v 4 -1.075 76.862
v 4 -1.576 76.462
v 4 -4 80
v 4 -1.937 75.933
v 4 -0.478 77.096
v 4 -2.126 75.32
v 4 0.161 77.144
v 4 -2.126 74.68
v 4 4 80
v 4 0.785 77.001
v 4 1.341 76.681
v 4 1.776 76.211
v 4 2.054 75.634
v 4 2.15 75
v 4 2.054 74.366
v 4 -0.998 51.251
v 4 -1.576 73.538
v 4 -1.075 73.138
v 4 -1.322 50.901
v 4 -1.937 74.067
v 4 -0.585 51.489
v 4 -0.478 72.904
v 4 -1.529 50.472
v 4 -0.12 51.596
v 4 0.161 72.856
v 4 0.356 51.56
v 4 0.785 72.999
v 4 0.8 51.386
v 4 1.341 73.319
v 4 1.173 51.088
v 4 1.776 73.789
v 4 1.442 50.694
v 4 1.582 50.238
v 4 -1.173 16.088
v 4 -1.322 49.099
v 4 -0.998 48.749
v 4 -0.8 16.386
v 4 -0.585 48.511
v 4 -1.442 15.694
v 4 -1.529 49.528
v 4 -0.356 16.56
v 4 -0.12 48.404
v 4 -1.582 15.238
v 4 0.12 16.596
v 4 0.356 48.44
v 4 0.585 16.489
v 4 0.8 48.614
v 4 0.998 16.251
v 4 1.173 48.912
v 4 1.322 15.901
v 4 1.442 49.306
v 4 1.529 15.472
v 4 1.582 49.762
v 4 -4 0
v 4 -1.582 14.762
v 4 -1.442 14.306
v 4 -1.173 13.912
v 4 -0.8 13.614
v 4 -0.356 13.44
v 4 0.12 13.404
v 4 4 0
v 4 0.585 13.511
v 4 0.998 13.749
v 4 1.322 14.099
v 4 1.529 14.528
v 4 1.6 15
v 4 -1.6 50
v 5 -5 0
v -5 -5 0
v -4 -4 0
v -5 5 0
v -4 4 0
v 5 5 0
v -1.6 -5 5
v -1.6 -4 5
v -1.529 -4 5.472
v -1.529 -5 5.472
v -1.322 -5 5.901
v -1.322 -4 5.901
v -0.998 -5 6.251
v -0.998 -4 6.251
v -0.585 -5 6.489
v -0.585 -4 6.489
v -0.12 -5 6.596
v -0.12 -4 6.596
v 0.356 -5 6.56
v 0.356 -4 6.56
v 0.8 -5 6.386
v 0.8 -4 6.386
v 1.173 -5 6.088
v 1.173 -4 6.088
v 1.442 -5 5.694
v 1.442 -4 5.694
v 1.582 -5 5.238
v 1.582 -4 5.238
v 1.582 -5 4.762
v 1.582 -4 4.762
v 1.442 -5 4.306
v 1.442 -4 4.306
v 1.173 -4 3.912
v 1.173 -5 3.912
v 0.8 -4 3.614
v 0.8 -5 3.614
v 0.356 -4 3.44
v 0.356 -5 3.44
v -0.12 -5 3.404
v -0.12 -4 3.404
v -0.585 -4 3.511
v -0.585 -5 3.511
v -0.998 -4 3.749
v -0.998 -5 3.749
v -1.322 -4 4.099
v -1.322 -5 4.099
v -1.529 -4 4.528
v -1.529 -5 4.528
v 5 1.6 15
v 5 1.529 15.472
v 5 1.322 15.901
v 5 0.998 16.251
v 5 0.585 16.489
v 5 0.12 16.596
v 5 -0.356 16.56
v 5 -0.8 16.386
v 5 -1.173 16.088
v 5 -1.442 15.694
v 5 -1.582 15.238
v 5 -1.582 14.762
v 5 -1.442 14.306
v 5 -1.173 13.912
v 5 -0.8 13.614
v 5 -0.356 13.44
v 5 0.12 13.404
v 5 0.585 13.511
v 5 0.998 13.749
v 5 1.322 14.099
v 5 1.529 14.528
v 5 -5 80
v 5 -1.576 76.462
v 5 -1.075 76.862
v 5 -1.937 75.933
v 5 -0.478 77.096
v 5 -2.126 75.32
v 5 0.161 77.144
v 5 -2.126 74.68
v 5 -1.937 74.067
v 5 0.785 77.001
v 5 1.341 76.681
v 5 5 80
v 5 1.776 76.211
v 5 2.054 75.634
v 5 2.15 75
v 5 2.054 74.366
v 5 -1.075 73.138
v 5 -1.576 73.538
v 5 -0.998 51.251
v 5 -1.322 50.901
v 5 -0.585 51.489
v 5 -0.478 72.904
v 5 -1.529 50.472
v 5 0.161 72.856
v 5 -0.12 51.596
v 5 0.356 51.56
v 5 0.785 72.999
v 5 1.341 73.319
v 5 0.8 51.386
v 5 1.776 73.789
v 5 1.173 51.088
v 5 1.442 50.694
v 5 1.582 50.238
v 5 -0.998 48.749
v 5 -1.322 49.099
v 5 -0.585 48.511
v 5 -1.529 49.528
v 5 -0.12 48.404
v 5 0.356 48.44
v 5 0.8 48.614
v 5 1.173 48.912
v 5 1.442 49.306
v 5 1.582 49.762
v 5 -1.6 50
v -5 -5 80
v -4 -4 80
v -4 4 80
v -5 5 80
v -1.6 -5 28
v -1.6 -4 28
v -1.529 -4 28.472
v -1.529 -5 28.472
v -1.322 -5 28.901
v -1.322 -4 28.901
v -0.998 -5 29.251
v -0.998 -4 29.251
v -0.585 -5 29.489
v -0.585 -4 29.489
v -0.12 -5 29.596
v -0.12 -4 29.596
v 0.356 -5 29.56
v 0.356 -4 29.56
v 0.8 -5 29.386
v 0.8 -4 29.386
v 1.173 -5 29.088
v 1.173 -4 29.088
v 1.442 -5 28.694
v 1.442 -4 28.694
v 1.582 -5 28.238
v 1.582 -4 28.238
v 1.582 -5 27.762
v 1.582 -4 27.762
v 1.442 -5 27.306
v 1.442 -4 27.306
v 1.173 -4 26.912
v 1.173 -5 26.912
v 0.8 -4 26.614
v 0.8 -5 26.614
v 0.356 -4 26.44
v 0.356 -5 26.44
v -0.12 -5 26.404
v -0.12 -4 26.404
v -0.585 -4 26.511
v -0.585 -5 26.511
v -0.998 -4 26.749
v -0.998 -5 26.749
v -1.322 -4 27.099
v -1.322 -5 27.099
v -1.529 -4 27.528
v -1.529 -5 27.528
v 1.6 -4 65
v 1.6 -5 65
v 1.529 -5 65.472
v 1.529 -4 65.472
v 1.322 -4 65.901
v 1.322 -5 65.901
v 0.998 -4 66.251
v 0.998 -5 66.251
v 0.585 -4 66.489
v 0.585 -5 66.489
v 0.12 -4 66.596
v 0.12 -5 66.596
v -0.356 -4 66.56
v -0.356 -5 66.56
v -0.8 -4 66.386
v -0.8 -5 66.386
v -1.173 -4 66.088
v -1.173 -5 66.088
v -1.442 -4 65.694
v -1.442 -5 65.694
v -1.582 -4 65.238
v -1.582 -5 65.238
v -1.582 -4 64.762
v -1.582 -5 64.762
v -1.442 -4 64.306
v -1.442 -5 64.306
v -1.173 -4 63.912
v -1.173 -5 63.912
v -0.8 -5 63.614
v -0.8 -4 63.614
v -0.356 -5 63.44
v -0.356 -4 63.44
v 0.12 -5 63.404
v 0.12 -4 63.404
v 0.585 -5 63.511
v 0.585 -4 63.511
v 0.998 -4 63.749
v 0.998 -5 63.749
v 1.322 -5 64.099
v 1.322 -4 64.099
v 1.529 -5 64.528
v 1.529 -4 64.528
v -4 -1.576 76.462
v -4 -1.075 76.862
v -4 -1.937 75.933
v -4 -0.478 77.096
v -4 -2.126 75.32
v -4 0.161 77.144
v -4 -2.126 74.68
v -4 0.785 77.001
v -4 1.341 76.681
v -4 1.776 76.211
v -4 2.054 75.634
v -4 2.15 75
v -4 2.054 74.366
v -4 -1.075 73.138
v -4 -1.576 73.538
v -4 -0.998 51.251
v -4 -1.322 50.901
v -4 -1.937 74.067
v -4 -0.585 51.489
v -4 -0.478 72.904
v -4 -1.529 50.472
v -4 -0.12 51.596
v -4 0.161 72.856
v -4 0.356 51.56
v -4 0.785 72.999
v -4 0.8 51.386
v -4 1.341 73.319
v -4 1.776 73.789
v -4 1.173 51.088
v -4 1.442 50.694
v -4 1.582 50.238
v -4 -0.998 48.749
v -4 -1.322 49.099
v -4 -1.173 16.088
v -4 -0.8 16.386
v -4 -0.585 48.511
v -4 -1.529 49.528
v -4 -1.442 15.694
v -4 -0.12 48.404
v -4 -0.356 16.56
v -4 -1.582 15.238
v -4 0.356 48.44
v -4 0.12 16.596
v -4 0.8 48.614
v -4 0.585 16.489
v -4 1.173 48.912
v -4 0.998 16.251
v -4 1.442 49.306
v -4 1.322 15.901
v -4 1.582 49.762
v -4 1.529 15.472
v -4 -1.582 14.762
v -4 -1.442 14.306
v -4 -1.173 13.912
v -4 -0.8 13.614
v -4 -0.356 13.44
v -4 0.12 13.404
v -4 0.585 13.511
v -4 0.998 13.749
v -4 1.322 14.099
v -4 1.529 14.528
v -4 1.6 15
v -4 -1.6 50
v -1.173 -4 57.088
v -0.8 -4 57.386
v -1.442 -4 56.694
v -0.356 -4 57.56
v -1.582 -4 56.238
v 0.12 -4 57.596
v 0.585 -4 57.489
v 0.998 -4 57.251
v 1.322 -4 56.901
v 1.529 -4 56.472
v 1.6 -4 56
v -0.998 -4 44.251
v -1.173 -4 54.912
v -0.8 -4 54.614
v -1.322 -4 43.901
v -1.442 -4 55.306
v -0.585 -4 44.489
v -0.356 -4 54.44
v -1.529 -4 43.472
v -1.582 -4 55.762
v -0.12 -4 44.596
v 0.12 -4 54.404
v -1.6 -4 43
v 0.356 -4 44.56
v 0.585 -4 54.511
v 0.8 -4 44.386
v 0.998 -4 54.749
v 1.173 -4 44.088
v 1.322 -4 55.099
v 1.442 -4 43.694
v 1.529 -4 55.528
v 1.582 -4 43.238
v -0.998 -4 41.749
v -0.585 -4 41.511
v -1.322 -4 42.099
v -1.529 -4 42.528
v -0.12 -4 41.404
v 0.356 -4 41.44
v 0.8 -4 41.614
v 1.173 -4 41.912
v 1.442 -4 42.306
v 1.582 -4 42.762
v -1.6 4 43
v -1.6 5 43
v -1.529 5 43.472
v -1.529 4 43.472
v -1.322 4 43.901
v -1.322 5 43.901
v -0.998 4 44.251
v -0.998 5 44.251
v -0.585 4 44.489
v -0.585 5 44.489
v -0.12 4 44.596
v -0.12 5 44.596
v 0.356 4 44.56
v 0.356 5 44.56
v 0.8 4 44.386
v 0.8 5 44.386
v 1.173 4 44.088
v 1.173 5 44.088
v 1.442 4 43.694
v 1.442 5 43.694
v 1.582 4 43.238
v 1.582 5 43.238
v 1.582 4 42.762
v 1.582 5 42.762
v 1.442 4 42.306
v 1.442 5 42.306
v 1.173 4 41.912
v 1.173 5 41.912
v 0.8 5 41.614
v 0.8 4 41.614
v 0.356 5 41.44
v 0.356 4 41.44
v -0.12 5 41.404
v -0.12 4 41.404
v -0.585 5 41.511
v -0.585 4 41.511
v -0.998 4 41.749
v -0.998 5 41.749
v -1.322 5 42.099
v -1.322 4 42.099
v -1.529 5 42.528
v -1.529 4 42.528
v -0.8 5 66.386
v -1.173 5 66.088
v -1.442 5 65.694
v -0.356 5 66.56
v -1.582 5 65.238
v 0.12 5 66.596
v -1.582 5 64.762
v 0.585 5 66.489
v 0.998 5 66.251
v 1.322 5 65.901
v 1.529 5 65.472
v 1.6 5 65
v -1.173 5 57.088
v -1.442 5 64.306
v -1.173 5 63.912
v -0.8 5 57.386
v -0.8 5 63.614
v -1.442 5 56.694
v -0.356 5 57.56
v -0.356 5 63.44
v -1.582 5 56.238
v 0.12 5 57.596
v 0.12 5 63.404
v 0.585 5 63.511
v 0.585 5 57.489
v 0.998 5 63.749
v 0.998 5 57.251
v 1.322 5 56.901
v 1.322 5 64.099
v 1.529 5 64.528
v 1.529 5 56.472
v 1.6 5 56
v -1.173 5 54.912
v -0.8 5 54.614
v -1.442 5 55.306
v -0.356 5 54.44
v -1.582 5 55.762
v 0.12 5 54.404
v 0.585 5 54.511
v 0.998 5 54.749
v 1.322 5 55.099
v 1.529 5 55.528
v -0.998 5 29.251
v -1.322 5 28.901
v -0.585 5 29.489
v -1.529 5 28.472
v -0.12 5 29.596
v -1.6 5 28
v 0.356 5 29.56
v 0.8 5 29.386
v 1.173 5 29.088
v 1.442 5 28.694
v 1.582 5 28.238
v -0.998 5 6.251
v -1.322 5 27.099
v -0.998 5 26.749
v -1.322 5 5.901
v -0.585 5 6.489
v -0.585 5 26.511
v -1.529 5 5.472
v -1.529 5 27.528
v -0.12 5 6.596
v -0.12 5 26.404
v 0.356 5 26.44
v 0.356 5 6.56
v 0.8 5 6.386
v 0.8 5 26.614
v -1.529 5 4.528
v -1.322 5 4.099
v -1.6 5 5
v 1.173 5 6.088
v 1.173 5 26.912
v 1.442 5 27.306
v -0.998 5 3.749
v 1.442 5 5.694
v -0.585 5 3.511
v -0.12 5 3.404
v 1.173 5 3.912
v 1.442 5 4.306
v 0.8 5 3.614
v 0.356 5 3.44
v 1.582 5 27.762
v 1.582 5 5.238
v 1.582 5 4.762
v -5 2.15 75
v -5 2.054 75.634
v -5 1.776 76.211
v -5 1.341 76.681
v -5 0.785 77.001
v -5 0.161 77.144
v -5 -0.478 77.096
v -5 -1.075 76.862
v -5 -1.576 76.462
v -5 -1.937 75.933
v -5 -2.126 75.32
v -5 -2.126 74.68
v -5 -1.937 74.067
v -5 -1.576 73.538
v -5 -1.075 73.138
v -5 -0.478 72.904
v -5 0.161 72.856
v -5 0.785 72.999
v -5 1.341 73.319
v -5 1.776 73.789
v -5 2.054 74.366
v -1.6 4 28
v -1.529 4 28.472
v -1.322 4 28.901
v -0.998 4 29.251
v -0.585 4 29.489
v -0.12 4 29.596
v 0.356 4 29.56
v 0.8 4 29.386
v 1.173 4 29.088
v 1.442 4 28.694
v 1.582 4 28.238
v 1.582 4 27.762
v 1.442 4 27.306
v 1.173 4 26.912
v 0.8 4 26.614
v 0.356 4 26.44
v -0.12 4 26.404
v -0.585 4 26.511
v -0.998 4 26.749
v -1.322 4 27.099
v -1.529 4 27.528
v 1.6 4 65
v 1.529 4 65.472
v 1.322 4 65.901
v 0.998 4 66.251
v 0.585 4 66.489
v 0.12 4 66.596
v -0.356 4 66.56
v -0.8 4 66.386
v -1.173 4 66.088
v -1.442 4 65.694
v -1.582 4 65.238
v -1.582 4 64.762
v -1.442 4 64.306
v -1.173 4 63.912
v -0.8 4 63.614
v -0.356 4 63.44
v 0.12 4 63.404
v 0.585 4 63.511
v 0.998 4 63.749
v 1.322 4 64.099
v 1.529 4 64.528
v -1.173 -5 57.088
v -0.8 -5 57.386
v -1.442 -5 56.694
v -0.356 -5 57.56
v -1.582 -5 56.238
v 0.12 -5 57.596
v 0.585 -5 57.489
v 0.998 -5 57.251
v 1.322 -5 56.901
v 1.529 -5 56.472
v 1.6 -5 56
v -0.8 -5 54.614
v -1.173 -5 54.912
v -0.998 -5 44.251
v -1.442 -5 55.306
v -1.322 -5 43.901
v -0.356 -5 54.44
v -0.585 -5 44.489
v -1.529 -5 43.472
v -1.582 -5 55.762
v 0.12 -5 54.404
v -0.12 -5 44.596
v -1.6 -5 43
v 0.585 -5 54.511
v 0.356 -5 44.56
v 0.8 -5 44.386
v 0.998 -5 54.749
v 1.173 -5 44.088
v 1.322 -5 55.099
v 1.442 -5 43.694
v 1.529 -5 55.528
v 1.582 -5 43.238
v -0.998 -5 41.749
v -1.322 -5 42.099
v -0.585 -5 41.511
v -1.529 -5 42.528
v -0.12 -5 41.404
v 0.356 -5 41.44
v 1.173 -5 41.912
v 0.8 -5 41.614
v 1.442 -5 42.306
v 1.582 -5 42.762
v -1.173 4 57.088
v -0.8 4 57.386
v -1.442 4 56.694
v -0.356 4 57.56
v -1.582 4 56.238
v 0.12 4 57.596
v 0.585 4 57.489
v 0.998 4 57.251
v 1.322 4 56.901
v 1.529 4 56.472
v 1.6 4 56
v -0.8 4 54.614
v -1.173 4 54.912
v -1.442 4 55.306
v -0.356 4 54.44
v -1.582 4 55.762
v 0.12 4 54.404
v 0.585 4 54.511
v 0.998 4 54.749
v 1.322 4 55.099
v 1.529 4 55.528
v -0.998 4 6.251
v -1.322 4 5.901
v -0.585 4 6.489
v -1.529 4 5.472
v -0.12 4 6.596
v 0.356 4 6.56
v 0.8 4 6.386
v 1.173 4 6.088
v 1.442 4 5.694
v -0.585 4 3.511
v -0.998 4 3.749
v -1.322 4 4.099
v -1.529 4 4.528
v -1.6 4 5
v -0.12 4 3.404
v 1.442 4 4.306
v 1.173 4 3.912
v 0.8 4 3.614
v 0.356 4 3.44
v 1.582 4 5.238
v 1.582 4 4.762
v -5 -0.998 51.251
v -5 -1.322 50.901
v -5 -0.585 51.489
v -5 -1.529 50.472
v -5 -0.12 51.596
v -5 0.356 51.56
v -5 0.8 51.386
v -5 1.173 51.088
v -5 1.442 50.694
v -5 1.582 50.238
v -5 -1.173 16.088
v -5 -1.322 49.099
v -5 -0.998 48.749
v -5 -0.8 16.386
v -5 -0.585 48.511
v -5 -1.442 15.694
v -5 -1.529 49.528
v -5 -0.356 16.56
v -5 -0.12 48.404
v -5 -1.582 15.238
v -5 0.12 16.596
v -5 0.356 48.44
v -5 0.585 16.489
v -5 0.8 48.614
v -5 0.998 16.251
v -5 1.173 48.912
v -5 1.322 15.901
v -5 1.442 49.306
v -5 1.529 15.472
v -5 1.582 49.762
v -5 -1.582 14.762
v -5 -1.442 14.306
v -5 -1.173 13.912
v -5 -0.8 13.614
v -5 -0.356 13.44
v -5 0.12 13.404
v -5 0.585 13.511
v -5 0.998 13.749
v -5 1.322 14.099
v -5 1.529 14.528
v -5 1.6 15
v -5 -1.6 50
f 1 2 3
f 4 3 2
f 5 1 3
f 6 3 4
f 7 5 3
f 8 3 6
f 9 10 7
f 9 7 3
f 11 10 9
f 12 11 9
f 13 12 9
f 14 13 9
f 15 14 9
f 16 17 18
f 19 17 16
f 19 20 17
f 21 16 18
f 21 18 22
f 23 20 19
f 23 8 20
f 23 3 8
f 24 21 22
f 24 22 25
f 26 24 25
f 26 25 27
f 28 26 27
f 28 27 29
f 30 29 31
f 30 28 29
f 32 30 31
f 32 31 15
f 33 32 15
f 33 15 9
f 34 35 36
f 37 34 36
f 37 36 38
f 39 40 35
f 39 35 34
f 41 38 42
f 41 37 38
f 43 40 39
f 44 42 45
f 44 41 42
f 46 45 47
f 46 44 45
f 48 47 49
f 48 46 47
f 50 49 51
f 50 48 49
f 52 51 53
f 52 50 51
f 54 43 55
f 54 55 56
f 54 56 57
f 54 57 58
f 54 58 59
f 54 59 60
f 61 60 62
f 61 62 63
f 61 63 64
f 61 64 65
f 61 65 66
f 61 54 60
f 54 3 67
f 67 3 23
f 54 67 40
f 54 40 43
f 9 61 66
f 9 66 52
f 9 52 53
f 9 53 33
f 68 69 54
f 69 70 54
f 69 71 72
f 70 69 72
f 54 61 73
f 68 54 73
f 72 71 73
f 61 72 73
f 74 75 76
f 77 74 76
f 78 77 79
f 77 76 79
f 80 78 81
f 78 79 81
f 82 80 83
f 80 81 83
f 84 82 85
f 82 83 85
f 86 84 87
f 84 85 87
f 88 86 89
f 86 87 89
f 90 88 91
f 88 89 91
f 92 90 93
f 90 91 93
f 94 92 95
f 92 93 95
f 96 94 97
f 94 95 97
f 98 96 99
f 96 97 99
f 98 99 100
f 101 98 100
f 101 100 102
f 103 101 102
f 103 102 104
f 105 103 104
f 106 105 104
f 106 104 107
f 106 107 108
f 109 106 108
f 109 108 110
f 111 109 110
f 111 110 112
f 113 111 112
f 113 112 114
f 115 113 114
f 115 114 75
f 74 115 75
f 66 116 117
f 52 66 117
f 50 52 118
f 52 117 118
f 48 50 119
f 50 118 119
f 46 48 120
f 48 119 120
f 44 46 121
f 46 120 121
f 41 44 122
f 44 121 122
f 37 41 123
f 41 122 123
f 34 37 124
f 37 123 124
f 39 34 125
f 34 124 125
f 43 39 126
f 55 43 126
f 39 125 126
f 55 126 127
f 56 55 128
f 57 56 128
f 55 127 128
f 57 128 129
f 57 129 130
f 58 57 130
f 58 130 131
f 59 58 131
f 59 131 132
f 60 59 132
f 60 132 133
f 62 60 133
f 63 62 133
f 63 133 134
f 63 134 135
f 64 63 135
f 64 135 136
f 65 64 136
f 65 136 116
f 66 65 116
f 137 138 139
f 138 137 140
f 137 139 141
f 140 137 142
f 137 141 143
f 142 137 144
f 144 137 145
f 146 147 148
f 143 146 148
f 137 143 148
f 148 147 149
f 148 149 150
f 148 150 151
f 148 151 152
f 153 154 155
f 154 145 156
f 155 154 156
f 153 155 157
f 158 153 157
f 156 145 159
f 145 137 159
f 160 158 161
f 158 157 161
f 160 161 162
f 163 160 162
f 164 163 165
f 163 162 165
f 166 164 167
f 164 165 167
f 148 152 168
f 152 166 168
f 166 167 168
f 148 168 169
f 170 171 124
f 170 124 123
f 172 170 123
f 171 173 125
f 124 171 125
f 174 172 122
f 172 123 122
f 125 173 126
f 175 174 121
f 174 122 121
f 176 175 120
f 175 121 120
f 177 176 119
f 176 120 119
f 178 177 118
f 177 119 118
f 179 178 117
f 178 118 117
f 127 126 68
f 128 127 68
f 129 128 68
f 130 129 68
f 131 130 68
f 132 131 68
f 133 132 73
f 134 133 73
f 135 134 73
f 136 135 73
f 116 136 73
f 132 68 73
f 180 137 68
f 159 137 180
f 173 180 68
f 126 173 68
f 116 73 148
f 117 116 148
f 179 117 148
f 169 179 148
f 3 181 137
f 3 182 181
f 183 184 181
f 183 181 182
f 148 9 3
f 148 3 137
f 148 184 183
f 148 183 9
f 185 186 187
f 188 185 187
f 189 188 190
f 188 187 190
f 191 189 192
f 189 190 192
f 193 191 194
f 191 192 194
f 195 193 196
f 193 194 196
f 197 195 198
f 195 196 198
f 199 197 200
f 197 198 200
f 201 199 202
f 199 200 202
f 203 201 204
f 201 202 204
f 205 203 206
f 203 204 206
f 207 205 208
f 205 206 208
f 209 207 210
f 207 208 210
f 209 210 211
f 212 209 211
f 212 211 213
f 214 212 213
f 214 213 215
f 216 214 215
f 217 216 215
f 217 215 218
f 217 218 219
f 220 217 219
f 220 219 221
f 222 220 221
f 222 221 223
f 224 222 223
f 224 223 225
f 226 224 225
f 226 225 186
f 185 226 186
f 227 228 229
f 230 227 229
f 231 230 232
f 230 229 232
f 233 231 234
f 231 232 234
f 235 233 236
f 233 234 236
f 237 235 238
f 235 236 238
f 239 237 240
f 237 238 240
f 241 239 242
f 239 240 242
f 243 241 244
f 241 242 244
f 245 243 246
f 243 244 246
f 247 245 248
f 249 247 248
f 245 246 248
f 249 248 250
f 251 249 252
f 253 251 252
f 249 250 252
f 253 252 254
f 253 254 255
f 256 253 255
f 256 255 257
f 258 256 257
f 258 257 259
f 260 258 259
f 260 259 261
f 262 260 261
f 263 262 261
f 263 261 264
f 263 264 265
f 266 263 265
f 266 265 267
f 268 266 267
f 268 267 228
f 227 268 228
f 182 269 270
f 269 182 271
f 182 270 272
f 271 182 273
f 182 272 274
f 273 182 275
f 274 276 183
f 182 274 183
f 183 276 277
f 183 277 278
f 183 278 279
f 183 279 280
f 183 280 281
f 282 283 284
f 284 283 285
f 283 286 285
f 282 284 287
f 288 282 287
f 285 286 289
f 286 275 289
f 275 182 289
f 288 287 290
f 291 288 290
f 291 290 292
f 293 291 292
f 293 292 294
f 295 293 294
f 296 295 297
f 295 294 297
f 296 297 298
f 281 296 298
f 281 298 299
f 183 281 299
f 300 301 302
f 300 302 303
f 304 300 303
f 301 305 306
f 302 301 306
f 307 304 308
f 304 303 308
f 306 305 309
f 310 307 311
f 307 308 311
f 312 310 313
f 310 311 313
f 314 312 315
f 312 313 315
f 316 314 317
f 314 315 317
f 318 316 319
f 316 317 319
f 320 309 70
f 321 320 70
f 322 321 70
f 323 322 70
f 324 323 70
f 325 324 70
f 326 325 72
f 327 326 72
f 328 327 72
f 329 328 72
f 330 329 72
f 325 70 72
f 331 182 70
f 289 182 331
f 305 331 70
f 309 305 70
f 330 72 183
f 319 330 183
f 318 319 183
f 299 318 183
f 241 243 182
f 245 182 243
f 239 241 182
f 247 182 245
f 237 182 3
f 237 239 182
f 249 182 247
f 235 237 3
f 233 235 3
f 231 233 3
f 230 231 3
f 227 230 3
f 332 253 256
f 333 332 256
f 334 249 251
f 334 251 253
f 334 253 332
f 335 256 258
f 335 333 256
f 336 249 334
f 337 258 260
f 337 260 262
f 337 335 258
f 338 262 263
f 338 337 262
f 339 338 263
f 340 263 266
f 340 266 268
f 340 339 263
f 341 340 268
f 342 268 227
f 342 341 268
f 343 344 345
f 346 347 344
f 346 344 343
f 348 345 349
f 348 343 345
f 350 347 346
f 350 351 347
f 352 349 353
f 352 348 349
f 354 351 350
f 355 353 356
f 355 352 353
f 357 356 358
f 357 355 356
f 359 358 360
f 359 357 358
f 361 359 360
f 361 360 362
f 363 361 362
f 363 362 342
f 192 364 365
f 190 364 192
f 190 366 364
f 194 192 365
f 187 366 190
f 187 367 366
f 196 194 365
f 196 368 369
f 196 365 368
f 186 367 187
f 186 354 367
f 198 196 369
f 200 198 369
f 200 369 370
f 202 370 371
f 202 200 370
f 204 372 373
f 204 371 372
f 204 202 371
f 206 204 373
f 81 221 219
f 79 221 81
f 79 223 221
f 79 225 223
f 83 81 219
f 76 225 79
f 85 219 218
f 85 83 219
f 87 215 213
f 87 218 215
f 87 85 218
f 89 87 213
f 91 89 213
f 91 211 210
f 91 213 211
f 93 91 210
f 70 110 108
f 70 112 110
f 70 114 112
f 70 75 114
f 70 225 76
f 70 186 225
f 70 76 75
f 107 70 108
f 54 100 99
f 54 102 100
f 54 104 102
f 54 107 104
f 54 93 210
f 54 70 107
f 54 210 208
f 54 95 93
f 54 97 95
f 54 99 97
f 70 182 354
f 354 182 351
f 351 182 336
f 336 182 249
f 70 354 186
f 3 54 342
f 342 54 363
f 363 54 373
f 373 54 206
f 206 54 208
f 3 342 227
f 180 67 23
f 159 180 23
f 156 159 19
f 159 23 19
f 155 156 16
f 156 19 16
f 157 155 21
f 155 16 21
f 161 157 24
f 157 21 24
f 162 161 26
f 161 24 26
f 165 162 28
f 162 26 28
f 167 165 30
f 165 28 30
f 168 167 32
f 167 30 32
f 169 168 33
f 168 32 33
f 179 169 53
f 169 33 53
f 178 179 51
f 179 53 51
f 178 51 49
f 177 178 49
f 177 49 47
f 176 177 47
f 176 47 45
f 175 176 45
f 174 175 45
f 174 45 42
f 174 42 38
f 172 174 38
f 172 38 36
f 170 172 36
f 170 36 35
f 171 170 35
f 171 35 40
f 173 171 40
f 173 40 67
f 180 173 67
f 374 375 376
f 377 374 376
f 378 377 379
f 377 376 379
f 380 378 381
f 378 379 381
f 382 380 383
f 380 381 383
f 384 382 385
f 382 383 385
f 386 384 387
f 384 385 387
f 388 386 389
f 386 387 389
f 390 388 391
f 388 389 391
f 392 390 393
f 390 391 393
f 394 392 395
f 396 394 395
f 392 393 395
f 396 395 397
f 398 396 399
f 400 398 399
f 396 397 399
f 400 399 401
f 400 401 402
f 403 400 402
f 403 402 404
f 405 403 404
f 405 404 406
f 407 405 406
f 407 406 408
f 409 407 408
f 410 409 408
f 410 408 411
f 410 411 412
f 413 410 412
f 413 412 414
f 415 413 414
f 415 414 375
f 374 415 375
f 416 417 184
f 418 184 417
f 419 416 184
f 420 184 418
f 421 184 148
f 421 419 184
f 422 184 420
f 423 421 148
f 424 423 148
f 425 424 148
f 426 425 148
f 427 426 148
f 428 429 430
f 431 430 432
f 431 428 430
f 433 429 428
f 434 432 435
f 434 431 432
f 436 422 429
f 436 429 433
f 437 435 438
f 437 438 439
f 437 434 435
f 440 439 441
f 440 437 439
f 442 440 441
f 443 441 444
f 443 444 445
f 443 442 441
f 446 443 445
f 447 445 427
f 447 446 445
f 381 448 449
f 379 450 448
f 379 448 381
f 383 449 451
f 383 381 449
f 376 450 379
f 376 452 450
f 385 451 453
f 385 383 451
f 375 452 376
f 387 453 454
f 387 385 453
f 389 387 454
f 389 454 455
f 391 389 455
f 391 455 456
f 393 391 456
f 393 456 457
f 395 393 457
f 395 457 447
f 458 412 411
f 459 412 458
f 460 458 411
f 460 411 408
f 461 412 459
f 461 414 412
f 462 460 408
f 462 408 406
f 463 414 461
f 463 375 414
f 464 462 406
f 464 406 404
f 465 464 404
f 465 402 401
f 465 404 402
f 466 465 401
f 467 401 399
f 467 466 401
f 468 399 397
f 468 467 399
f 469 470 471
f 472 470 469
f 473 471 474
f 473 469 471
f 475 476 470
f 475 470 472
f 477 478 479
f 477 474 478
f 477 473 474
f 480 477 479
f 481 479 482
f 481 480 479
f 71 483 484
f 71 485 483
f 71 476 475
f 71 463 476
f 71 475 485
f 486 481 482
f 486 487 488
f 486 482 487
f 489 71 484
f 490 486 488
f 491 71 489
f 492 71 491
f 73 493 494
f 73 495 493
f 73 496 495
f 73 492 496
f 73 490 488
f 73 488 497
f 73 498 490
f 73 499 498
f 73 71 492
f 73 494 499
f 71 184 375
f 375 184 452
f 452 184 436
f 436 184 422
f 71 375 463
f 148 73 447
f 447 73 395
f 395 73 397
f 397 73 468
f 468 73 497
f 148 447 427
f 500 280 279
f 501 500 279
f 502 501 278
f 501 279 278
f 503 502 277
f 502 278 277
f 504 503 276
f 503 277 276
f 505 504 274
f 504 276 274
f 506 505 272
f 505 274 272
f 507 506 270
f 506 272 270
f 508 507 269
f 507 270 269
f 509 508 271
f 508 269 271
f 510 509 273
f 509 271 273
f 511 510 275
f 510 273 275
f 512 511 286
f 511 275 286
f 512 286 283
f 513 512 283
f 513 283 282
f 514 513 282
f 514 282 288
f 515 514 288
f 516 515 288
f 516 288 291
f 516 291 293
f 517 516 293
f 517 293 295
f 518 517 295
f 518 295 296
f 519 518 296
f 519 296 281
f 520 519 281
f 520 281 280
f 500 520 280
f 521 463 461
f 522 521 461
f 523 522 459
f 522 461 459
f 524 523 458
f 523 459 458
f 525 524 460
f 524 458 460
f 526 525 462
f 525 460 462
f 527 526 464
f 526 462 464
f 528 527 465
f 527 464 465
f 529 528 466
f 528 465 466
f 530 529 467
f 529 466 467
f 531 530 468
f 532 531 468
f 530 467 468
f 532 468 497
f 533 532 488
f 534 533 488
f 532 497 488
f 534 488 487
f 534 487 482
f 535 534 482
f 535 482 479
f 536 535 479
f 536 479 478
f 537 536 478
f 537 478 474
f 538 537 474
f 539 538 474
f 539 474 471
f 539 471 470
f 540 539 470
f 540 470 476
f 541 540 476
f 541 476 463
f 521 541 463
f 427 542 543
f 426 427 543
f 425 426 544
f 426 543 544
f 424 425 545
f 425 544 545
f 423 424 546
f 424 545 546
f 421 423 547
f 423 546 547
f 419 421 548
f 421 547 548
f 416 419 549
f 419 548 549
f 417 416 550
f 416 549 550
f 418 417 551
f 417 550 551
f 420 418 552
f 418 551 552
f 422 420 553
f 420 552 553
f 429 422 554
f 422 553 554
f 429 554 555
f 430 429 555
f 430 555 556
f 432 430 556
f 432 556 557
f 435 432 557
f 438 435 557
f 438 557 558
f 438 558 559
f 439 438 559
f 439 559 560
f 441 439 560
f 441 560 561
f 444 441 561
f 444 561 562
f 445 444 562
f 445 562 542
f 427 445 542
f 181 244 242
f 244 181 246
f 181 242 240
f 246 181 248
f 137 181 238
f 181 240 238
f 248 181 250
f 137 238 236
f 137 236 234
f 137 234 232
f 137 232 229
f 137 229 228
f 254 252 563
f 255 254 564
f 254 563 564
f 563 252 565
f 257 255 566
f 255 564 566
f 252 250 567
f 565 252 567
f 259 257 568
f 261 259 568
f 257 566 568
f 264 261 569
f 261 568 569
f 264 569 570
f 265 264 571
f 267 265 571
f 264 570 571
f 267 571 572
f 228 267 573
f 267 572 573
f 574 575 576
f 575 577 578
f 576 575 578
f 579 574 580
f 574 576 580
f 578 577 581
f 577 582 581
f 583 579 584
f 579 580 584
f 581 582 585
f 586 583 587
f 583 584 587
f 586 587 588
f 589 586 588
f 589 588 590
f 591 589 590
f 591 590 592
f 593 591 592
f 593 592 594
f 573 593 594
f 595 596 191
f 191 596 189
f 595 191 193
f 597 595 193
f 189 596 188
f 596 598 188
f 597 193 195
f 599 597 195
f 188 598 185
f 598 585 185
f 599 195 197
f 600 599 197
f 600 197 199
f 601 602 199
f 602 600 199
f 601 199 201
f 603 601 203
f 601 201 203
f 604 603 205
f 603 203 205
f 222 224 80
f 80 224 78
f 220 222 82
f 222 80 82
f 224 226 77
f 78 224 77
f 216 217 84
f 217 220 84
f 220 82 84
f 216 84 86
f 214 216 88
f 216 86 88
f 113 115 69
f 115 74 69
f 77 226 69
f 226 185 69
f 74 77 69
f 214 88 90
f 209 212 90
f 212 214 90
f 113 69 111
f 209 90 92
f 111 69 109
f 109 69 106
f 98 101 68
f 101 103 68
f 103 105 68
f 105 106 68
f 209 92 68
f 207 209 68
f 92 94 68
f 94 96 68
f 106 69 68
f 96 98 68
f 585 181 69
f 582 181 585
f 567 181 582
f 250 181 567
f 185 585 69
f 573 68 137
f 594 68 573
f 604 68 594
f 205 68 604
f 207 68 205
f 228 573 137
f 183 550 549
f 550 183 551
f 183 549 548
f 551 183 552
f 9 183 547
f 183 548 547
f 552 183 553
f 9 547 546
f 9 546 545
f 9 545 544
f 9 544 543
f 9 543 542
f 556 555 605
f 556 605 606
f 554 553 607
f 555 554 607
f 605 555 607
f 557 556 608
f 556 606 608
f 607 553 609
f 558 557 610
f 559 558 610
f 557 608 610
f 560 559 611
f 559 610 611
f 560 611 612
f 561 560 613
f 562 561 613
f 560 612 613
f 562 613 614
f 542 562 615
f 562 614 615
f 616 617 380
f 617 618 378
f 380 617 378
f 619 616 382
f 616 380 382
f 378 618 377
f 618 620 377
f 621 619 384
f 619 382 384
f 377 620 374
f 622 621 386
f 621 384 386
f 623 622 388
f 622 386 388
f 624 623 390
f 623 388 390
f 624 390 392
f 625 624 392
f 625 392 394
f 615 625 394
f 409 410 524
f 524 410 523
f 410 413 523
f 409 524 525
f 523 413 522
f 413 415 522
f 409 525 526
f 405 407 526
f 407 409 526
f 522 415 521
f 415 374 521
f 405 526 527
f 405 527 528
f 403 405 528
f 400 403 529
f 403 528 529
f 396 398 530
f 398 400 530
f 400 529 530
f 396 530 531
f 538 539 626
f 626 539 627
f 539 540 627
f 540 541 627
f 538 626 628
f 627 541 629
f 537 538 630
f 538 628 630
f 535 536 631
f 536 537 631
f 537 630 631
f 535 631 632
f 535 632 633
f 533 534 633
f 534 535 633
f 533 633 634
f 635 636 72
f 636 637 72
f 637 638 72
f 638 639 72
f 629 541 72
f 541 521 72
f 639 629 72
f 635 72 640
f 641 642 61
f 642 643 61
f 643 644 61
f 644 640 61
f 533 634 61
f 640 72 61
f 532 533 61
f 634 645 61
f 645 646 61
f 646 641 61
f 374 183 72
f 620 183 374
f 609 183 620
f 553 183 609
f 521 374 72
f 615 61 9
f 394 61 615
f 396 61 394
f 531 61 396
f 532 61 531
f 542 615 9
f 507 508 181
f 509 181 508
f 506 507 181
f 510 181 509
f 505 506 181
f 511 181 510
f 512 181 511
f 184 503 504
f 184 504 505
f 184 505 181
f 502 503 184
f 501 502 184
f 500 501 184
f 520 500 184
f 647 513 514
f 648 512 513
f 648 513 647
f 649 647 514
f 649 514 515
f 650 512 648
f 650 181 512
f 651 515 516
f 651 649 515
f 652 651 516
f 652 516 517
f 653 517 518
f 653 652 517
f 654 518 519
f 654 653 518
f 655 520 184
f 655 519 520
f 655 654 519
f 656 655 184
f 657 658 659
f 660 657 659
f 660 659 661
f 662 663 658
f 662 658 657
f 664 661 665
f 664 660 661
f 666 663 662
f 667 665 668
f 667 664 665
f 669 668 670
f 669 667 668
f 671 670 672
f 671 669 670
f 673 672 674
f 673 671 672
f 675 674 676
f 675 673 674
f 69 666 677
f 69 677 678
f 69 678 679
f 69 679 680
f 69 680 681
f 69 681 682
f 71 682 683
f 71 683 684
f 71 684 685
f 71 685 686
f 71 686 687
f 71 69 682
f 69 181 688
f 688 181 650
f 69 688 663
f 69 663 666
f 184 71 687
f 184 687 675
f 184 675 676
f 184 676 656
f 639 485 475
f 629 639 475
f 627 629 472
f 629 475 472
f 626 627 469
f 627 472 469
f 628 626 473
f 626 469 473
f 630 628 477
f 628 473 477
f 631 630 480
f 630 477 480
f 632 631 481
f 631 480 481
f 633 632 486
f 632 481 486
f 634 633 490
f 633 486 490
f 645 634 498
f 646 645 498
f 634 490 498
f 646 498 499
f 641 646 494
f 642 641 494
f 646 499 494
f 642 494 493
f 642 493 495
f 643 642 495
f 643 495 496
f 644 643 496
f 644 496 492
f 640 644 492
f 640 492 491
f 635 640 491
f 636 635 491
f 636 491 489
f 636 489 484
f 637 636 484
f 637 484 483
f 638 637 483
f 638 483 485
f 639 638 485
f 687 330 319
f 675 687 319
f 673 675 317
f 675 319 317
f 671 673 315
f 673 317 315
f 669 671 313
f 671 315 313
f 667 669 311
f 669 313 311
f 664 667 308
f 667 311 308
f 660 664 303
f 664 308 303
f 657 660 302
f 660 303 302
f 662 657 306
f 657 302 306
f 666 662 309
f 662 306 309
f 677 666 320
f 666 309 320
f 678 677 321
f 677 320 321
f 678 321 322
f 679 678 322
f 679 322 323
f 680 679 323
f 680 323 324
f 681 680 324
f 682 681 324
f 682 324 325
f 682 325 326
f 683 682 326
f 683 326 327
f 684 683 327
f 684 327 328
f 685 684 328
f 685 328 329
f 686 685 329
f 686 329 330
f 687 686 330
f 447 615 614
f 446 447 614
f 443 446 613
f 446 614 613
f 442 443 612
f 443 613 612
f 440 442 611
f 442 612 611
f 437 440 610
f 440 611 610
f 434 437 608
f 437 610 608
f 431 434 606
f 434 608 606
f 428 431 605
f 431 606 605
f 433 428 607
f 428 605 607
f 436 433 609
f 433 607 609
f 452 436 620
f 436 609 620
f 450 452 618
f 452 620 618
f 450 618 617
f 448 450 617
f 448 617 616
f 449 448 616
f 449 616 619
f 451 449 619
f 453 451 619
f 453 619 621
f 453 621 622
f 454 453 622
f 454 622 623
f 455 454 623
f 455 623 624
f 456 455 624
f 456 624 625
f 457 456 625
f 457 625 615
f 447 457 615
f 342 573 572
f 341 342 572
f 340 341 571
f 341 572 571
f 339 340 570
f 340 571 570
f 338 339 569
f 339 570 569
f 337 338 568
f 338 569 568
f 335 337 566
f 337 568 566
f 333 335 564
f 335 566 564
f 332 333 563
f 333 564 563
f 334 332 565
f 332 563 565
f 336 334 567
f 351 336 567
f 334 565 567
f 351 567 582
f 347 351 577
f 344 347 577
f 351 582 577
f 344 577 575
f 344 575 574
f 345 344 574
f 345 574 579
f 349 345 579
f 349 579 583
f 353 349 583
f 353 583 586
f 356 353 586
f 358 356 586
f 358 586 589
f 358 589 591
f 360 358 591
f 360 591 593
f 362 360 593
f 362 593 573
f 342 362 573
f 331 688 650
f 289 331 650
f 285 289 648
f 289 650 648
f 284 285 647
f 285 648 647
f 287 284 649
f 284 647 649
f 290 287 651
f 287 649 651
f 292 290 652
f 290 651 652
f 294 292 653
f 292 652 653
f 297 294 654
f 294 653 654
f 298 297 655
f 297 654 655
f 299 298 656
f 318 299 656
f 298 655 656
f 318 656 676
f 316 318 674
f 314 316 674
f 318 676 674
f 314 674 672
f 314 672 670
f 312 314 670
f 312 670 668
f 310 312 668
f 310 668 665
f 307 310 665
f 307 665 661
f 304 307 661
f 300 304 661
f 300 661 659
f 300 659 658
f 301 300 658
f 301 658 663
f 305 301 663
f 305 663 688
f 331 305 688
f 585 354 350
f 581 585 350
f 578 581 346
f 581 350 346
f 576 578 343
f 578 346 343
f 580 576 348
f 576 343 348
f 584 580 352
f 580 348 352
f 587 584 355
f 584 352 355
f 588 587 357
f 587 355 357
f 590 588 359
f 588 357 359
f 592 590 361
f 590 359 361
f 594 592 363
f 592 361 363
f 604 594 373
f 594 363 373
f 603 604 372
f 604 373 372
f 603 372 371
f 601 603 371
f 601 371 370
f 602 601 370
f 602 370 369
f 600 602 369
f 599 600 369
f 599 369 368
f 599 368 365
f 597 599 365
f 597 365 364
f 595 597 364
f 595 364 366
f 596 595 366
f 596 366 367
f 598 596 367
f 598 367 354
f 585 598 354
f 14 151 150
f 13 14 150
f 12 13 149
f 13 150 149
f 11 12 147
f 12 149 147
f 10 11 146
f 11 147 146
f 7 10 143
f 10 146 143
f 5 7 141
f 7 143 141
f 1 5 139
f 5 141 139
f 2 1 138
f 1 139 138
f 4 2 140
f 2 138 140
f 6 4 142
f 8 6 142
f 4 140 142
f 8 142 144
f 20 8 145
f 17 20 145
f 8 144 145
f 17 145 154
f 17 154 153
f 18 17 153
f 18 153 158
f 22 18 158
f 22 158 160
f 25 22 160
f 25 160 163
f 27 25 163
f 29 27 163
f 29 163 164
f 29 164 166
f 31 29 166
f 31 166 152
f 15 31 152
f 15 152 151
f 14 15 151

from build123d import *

# Parameters (mm, degrees)
SKETCH_1_W          = 10
SKETCH_1_H          = 10
SKETCH_1_W_2        = 8
SKETCH_1_H_2        = 8
EXTRUDE_1_DEPTH     = 80
SKETCH_2_R          = 1.6
CUT_EXTRUDE_1_DEPTH = 81.777472107
SKETCH_3_R          = 1.6
CUT_EXTRUDE_2_DEPTH = 81.777472107
SKETCH_4_R          = 1.6
CUT_EXTRUDE_3_DEPTH = 81.777472107
SKETCH_5_R          = 1.6
CUT_EXTRUDE_4_DEPTH = 81.777472107
SKETCH_6_R          = 1.6
CUT_EXTRUDE_5_DEPTH = 81.777472107
SKETCH_7_R          = 2.15
CUT_EXTRUDE_6_DEPTH = 81.777472107


with BuildPart() as part:
    # ｽｹｯﾁ1 → 押し出し-薄板1 (new body)
    with BuildSketch(Plane.XY):
        Rectangle(SKETCH_1_W, SKETCH_1_H)
        Rectangle(SKETCH_1_W_2, SKETCH_1_H_2, mode=Mode.SUBTRACT)
    extrude(amount=EXTRUDE_1_DEPTH)

    # ｽｹｯﾁ2 → ｶｯﾄ - 押し出し1 (cut, through all)
    with BuildSketch(Plane(origin=(0, 5, 0), x_dir=(1, 0, 0), z_dir=(0, 1, 0))):
        with Locations(Location((0, -5, 0), (0, 0, 180))):
            Circle(SKETCH_2_R)
    extrude(amount=-CUT_EXTRUDE_1_DEPTH, mode=Mode.SUBTRACT)

    # ｽｹｯﾁ3 → ｶｯﾄ - 押し出し2 (cut, through all)
    with BuildSketch(Plane(origin=(5, 0, 0), x_dir=(0, 0, -1), z_dir=(1, 0, 0))):
        with Locations(Location((-15, 0, 0), (0, 0, 90))):
            Circle(SKETCH_3_R)
    extrude(amount=-CUT_EXTRUDE_2_DEPTH, mode=Mode.SUBTRACT)

    # ｽｹｯﾁ4 → ｶｯﾄ - 押し出し3 (cut, through all)
    with BuildSketch(Plane.XZ.offset(5)):
        with Locations((0, 65)):
            Circle(SKETCH_4_R)
        with Locations((0, 56)):
            Circle(SKETCH_4_R)
    extrude(amount=-CUT_EXTRUDE_3_DEPTH, mode=Mode.SUBTRACT)

    # ｽｹｯﾁ5 → ｶｯﾄ - 押し出し4 (cut, through all)
    with BuildSketch(Plane.ZY.offset(5)):
        with Locations(Location((50, 0, 0), (0, 0, 270))):
            Circle(SKETCH_5_R)
    extrude(amount=-CUT_EXTRUDE_4_DEPTH, mode=Mode.SUBTRACT)

    # ｽｹｯﾁ6 → ｶｯﾄ - 押し出し5 (cut, through all)
    with BuildSketch(Plane(origin=(0, 5, 0), x_dir=(1, 0, 0), z_dir=(0, 1, 0))):
        with Locations(Location((0, -43, 0), (0, 0, 180))):
            Circle(SKETCH_6_R)
        with Locations(Location((0, -28, 0), (0, 0, 180))):
            Circle(SKETCH_6_R)
    extrude(amount=-CUT_EXTRUDE_5_DEPTH, mode=Mode.SUBTRACT)

    # ｽｹｯﾁ7 → ｶｯﾄ - 押し出し6 (cut, through all)
    with BuildSketch(Plane(origin=(5, 0, 0), x_dir=(0, 0, -1), z_dir=(1, 0, 0))):
        with Locations(Location((-75, 0, 0), (0, 0, 90))):
            Circle(SKETCH_7_R)
    extrude(amount=-CUT_EXTRUDE_6_DEPTH, mode=Mode.SUBTRACT)


solid = part.part
